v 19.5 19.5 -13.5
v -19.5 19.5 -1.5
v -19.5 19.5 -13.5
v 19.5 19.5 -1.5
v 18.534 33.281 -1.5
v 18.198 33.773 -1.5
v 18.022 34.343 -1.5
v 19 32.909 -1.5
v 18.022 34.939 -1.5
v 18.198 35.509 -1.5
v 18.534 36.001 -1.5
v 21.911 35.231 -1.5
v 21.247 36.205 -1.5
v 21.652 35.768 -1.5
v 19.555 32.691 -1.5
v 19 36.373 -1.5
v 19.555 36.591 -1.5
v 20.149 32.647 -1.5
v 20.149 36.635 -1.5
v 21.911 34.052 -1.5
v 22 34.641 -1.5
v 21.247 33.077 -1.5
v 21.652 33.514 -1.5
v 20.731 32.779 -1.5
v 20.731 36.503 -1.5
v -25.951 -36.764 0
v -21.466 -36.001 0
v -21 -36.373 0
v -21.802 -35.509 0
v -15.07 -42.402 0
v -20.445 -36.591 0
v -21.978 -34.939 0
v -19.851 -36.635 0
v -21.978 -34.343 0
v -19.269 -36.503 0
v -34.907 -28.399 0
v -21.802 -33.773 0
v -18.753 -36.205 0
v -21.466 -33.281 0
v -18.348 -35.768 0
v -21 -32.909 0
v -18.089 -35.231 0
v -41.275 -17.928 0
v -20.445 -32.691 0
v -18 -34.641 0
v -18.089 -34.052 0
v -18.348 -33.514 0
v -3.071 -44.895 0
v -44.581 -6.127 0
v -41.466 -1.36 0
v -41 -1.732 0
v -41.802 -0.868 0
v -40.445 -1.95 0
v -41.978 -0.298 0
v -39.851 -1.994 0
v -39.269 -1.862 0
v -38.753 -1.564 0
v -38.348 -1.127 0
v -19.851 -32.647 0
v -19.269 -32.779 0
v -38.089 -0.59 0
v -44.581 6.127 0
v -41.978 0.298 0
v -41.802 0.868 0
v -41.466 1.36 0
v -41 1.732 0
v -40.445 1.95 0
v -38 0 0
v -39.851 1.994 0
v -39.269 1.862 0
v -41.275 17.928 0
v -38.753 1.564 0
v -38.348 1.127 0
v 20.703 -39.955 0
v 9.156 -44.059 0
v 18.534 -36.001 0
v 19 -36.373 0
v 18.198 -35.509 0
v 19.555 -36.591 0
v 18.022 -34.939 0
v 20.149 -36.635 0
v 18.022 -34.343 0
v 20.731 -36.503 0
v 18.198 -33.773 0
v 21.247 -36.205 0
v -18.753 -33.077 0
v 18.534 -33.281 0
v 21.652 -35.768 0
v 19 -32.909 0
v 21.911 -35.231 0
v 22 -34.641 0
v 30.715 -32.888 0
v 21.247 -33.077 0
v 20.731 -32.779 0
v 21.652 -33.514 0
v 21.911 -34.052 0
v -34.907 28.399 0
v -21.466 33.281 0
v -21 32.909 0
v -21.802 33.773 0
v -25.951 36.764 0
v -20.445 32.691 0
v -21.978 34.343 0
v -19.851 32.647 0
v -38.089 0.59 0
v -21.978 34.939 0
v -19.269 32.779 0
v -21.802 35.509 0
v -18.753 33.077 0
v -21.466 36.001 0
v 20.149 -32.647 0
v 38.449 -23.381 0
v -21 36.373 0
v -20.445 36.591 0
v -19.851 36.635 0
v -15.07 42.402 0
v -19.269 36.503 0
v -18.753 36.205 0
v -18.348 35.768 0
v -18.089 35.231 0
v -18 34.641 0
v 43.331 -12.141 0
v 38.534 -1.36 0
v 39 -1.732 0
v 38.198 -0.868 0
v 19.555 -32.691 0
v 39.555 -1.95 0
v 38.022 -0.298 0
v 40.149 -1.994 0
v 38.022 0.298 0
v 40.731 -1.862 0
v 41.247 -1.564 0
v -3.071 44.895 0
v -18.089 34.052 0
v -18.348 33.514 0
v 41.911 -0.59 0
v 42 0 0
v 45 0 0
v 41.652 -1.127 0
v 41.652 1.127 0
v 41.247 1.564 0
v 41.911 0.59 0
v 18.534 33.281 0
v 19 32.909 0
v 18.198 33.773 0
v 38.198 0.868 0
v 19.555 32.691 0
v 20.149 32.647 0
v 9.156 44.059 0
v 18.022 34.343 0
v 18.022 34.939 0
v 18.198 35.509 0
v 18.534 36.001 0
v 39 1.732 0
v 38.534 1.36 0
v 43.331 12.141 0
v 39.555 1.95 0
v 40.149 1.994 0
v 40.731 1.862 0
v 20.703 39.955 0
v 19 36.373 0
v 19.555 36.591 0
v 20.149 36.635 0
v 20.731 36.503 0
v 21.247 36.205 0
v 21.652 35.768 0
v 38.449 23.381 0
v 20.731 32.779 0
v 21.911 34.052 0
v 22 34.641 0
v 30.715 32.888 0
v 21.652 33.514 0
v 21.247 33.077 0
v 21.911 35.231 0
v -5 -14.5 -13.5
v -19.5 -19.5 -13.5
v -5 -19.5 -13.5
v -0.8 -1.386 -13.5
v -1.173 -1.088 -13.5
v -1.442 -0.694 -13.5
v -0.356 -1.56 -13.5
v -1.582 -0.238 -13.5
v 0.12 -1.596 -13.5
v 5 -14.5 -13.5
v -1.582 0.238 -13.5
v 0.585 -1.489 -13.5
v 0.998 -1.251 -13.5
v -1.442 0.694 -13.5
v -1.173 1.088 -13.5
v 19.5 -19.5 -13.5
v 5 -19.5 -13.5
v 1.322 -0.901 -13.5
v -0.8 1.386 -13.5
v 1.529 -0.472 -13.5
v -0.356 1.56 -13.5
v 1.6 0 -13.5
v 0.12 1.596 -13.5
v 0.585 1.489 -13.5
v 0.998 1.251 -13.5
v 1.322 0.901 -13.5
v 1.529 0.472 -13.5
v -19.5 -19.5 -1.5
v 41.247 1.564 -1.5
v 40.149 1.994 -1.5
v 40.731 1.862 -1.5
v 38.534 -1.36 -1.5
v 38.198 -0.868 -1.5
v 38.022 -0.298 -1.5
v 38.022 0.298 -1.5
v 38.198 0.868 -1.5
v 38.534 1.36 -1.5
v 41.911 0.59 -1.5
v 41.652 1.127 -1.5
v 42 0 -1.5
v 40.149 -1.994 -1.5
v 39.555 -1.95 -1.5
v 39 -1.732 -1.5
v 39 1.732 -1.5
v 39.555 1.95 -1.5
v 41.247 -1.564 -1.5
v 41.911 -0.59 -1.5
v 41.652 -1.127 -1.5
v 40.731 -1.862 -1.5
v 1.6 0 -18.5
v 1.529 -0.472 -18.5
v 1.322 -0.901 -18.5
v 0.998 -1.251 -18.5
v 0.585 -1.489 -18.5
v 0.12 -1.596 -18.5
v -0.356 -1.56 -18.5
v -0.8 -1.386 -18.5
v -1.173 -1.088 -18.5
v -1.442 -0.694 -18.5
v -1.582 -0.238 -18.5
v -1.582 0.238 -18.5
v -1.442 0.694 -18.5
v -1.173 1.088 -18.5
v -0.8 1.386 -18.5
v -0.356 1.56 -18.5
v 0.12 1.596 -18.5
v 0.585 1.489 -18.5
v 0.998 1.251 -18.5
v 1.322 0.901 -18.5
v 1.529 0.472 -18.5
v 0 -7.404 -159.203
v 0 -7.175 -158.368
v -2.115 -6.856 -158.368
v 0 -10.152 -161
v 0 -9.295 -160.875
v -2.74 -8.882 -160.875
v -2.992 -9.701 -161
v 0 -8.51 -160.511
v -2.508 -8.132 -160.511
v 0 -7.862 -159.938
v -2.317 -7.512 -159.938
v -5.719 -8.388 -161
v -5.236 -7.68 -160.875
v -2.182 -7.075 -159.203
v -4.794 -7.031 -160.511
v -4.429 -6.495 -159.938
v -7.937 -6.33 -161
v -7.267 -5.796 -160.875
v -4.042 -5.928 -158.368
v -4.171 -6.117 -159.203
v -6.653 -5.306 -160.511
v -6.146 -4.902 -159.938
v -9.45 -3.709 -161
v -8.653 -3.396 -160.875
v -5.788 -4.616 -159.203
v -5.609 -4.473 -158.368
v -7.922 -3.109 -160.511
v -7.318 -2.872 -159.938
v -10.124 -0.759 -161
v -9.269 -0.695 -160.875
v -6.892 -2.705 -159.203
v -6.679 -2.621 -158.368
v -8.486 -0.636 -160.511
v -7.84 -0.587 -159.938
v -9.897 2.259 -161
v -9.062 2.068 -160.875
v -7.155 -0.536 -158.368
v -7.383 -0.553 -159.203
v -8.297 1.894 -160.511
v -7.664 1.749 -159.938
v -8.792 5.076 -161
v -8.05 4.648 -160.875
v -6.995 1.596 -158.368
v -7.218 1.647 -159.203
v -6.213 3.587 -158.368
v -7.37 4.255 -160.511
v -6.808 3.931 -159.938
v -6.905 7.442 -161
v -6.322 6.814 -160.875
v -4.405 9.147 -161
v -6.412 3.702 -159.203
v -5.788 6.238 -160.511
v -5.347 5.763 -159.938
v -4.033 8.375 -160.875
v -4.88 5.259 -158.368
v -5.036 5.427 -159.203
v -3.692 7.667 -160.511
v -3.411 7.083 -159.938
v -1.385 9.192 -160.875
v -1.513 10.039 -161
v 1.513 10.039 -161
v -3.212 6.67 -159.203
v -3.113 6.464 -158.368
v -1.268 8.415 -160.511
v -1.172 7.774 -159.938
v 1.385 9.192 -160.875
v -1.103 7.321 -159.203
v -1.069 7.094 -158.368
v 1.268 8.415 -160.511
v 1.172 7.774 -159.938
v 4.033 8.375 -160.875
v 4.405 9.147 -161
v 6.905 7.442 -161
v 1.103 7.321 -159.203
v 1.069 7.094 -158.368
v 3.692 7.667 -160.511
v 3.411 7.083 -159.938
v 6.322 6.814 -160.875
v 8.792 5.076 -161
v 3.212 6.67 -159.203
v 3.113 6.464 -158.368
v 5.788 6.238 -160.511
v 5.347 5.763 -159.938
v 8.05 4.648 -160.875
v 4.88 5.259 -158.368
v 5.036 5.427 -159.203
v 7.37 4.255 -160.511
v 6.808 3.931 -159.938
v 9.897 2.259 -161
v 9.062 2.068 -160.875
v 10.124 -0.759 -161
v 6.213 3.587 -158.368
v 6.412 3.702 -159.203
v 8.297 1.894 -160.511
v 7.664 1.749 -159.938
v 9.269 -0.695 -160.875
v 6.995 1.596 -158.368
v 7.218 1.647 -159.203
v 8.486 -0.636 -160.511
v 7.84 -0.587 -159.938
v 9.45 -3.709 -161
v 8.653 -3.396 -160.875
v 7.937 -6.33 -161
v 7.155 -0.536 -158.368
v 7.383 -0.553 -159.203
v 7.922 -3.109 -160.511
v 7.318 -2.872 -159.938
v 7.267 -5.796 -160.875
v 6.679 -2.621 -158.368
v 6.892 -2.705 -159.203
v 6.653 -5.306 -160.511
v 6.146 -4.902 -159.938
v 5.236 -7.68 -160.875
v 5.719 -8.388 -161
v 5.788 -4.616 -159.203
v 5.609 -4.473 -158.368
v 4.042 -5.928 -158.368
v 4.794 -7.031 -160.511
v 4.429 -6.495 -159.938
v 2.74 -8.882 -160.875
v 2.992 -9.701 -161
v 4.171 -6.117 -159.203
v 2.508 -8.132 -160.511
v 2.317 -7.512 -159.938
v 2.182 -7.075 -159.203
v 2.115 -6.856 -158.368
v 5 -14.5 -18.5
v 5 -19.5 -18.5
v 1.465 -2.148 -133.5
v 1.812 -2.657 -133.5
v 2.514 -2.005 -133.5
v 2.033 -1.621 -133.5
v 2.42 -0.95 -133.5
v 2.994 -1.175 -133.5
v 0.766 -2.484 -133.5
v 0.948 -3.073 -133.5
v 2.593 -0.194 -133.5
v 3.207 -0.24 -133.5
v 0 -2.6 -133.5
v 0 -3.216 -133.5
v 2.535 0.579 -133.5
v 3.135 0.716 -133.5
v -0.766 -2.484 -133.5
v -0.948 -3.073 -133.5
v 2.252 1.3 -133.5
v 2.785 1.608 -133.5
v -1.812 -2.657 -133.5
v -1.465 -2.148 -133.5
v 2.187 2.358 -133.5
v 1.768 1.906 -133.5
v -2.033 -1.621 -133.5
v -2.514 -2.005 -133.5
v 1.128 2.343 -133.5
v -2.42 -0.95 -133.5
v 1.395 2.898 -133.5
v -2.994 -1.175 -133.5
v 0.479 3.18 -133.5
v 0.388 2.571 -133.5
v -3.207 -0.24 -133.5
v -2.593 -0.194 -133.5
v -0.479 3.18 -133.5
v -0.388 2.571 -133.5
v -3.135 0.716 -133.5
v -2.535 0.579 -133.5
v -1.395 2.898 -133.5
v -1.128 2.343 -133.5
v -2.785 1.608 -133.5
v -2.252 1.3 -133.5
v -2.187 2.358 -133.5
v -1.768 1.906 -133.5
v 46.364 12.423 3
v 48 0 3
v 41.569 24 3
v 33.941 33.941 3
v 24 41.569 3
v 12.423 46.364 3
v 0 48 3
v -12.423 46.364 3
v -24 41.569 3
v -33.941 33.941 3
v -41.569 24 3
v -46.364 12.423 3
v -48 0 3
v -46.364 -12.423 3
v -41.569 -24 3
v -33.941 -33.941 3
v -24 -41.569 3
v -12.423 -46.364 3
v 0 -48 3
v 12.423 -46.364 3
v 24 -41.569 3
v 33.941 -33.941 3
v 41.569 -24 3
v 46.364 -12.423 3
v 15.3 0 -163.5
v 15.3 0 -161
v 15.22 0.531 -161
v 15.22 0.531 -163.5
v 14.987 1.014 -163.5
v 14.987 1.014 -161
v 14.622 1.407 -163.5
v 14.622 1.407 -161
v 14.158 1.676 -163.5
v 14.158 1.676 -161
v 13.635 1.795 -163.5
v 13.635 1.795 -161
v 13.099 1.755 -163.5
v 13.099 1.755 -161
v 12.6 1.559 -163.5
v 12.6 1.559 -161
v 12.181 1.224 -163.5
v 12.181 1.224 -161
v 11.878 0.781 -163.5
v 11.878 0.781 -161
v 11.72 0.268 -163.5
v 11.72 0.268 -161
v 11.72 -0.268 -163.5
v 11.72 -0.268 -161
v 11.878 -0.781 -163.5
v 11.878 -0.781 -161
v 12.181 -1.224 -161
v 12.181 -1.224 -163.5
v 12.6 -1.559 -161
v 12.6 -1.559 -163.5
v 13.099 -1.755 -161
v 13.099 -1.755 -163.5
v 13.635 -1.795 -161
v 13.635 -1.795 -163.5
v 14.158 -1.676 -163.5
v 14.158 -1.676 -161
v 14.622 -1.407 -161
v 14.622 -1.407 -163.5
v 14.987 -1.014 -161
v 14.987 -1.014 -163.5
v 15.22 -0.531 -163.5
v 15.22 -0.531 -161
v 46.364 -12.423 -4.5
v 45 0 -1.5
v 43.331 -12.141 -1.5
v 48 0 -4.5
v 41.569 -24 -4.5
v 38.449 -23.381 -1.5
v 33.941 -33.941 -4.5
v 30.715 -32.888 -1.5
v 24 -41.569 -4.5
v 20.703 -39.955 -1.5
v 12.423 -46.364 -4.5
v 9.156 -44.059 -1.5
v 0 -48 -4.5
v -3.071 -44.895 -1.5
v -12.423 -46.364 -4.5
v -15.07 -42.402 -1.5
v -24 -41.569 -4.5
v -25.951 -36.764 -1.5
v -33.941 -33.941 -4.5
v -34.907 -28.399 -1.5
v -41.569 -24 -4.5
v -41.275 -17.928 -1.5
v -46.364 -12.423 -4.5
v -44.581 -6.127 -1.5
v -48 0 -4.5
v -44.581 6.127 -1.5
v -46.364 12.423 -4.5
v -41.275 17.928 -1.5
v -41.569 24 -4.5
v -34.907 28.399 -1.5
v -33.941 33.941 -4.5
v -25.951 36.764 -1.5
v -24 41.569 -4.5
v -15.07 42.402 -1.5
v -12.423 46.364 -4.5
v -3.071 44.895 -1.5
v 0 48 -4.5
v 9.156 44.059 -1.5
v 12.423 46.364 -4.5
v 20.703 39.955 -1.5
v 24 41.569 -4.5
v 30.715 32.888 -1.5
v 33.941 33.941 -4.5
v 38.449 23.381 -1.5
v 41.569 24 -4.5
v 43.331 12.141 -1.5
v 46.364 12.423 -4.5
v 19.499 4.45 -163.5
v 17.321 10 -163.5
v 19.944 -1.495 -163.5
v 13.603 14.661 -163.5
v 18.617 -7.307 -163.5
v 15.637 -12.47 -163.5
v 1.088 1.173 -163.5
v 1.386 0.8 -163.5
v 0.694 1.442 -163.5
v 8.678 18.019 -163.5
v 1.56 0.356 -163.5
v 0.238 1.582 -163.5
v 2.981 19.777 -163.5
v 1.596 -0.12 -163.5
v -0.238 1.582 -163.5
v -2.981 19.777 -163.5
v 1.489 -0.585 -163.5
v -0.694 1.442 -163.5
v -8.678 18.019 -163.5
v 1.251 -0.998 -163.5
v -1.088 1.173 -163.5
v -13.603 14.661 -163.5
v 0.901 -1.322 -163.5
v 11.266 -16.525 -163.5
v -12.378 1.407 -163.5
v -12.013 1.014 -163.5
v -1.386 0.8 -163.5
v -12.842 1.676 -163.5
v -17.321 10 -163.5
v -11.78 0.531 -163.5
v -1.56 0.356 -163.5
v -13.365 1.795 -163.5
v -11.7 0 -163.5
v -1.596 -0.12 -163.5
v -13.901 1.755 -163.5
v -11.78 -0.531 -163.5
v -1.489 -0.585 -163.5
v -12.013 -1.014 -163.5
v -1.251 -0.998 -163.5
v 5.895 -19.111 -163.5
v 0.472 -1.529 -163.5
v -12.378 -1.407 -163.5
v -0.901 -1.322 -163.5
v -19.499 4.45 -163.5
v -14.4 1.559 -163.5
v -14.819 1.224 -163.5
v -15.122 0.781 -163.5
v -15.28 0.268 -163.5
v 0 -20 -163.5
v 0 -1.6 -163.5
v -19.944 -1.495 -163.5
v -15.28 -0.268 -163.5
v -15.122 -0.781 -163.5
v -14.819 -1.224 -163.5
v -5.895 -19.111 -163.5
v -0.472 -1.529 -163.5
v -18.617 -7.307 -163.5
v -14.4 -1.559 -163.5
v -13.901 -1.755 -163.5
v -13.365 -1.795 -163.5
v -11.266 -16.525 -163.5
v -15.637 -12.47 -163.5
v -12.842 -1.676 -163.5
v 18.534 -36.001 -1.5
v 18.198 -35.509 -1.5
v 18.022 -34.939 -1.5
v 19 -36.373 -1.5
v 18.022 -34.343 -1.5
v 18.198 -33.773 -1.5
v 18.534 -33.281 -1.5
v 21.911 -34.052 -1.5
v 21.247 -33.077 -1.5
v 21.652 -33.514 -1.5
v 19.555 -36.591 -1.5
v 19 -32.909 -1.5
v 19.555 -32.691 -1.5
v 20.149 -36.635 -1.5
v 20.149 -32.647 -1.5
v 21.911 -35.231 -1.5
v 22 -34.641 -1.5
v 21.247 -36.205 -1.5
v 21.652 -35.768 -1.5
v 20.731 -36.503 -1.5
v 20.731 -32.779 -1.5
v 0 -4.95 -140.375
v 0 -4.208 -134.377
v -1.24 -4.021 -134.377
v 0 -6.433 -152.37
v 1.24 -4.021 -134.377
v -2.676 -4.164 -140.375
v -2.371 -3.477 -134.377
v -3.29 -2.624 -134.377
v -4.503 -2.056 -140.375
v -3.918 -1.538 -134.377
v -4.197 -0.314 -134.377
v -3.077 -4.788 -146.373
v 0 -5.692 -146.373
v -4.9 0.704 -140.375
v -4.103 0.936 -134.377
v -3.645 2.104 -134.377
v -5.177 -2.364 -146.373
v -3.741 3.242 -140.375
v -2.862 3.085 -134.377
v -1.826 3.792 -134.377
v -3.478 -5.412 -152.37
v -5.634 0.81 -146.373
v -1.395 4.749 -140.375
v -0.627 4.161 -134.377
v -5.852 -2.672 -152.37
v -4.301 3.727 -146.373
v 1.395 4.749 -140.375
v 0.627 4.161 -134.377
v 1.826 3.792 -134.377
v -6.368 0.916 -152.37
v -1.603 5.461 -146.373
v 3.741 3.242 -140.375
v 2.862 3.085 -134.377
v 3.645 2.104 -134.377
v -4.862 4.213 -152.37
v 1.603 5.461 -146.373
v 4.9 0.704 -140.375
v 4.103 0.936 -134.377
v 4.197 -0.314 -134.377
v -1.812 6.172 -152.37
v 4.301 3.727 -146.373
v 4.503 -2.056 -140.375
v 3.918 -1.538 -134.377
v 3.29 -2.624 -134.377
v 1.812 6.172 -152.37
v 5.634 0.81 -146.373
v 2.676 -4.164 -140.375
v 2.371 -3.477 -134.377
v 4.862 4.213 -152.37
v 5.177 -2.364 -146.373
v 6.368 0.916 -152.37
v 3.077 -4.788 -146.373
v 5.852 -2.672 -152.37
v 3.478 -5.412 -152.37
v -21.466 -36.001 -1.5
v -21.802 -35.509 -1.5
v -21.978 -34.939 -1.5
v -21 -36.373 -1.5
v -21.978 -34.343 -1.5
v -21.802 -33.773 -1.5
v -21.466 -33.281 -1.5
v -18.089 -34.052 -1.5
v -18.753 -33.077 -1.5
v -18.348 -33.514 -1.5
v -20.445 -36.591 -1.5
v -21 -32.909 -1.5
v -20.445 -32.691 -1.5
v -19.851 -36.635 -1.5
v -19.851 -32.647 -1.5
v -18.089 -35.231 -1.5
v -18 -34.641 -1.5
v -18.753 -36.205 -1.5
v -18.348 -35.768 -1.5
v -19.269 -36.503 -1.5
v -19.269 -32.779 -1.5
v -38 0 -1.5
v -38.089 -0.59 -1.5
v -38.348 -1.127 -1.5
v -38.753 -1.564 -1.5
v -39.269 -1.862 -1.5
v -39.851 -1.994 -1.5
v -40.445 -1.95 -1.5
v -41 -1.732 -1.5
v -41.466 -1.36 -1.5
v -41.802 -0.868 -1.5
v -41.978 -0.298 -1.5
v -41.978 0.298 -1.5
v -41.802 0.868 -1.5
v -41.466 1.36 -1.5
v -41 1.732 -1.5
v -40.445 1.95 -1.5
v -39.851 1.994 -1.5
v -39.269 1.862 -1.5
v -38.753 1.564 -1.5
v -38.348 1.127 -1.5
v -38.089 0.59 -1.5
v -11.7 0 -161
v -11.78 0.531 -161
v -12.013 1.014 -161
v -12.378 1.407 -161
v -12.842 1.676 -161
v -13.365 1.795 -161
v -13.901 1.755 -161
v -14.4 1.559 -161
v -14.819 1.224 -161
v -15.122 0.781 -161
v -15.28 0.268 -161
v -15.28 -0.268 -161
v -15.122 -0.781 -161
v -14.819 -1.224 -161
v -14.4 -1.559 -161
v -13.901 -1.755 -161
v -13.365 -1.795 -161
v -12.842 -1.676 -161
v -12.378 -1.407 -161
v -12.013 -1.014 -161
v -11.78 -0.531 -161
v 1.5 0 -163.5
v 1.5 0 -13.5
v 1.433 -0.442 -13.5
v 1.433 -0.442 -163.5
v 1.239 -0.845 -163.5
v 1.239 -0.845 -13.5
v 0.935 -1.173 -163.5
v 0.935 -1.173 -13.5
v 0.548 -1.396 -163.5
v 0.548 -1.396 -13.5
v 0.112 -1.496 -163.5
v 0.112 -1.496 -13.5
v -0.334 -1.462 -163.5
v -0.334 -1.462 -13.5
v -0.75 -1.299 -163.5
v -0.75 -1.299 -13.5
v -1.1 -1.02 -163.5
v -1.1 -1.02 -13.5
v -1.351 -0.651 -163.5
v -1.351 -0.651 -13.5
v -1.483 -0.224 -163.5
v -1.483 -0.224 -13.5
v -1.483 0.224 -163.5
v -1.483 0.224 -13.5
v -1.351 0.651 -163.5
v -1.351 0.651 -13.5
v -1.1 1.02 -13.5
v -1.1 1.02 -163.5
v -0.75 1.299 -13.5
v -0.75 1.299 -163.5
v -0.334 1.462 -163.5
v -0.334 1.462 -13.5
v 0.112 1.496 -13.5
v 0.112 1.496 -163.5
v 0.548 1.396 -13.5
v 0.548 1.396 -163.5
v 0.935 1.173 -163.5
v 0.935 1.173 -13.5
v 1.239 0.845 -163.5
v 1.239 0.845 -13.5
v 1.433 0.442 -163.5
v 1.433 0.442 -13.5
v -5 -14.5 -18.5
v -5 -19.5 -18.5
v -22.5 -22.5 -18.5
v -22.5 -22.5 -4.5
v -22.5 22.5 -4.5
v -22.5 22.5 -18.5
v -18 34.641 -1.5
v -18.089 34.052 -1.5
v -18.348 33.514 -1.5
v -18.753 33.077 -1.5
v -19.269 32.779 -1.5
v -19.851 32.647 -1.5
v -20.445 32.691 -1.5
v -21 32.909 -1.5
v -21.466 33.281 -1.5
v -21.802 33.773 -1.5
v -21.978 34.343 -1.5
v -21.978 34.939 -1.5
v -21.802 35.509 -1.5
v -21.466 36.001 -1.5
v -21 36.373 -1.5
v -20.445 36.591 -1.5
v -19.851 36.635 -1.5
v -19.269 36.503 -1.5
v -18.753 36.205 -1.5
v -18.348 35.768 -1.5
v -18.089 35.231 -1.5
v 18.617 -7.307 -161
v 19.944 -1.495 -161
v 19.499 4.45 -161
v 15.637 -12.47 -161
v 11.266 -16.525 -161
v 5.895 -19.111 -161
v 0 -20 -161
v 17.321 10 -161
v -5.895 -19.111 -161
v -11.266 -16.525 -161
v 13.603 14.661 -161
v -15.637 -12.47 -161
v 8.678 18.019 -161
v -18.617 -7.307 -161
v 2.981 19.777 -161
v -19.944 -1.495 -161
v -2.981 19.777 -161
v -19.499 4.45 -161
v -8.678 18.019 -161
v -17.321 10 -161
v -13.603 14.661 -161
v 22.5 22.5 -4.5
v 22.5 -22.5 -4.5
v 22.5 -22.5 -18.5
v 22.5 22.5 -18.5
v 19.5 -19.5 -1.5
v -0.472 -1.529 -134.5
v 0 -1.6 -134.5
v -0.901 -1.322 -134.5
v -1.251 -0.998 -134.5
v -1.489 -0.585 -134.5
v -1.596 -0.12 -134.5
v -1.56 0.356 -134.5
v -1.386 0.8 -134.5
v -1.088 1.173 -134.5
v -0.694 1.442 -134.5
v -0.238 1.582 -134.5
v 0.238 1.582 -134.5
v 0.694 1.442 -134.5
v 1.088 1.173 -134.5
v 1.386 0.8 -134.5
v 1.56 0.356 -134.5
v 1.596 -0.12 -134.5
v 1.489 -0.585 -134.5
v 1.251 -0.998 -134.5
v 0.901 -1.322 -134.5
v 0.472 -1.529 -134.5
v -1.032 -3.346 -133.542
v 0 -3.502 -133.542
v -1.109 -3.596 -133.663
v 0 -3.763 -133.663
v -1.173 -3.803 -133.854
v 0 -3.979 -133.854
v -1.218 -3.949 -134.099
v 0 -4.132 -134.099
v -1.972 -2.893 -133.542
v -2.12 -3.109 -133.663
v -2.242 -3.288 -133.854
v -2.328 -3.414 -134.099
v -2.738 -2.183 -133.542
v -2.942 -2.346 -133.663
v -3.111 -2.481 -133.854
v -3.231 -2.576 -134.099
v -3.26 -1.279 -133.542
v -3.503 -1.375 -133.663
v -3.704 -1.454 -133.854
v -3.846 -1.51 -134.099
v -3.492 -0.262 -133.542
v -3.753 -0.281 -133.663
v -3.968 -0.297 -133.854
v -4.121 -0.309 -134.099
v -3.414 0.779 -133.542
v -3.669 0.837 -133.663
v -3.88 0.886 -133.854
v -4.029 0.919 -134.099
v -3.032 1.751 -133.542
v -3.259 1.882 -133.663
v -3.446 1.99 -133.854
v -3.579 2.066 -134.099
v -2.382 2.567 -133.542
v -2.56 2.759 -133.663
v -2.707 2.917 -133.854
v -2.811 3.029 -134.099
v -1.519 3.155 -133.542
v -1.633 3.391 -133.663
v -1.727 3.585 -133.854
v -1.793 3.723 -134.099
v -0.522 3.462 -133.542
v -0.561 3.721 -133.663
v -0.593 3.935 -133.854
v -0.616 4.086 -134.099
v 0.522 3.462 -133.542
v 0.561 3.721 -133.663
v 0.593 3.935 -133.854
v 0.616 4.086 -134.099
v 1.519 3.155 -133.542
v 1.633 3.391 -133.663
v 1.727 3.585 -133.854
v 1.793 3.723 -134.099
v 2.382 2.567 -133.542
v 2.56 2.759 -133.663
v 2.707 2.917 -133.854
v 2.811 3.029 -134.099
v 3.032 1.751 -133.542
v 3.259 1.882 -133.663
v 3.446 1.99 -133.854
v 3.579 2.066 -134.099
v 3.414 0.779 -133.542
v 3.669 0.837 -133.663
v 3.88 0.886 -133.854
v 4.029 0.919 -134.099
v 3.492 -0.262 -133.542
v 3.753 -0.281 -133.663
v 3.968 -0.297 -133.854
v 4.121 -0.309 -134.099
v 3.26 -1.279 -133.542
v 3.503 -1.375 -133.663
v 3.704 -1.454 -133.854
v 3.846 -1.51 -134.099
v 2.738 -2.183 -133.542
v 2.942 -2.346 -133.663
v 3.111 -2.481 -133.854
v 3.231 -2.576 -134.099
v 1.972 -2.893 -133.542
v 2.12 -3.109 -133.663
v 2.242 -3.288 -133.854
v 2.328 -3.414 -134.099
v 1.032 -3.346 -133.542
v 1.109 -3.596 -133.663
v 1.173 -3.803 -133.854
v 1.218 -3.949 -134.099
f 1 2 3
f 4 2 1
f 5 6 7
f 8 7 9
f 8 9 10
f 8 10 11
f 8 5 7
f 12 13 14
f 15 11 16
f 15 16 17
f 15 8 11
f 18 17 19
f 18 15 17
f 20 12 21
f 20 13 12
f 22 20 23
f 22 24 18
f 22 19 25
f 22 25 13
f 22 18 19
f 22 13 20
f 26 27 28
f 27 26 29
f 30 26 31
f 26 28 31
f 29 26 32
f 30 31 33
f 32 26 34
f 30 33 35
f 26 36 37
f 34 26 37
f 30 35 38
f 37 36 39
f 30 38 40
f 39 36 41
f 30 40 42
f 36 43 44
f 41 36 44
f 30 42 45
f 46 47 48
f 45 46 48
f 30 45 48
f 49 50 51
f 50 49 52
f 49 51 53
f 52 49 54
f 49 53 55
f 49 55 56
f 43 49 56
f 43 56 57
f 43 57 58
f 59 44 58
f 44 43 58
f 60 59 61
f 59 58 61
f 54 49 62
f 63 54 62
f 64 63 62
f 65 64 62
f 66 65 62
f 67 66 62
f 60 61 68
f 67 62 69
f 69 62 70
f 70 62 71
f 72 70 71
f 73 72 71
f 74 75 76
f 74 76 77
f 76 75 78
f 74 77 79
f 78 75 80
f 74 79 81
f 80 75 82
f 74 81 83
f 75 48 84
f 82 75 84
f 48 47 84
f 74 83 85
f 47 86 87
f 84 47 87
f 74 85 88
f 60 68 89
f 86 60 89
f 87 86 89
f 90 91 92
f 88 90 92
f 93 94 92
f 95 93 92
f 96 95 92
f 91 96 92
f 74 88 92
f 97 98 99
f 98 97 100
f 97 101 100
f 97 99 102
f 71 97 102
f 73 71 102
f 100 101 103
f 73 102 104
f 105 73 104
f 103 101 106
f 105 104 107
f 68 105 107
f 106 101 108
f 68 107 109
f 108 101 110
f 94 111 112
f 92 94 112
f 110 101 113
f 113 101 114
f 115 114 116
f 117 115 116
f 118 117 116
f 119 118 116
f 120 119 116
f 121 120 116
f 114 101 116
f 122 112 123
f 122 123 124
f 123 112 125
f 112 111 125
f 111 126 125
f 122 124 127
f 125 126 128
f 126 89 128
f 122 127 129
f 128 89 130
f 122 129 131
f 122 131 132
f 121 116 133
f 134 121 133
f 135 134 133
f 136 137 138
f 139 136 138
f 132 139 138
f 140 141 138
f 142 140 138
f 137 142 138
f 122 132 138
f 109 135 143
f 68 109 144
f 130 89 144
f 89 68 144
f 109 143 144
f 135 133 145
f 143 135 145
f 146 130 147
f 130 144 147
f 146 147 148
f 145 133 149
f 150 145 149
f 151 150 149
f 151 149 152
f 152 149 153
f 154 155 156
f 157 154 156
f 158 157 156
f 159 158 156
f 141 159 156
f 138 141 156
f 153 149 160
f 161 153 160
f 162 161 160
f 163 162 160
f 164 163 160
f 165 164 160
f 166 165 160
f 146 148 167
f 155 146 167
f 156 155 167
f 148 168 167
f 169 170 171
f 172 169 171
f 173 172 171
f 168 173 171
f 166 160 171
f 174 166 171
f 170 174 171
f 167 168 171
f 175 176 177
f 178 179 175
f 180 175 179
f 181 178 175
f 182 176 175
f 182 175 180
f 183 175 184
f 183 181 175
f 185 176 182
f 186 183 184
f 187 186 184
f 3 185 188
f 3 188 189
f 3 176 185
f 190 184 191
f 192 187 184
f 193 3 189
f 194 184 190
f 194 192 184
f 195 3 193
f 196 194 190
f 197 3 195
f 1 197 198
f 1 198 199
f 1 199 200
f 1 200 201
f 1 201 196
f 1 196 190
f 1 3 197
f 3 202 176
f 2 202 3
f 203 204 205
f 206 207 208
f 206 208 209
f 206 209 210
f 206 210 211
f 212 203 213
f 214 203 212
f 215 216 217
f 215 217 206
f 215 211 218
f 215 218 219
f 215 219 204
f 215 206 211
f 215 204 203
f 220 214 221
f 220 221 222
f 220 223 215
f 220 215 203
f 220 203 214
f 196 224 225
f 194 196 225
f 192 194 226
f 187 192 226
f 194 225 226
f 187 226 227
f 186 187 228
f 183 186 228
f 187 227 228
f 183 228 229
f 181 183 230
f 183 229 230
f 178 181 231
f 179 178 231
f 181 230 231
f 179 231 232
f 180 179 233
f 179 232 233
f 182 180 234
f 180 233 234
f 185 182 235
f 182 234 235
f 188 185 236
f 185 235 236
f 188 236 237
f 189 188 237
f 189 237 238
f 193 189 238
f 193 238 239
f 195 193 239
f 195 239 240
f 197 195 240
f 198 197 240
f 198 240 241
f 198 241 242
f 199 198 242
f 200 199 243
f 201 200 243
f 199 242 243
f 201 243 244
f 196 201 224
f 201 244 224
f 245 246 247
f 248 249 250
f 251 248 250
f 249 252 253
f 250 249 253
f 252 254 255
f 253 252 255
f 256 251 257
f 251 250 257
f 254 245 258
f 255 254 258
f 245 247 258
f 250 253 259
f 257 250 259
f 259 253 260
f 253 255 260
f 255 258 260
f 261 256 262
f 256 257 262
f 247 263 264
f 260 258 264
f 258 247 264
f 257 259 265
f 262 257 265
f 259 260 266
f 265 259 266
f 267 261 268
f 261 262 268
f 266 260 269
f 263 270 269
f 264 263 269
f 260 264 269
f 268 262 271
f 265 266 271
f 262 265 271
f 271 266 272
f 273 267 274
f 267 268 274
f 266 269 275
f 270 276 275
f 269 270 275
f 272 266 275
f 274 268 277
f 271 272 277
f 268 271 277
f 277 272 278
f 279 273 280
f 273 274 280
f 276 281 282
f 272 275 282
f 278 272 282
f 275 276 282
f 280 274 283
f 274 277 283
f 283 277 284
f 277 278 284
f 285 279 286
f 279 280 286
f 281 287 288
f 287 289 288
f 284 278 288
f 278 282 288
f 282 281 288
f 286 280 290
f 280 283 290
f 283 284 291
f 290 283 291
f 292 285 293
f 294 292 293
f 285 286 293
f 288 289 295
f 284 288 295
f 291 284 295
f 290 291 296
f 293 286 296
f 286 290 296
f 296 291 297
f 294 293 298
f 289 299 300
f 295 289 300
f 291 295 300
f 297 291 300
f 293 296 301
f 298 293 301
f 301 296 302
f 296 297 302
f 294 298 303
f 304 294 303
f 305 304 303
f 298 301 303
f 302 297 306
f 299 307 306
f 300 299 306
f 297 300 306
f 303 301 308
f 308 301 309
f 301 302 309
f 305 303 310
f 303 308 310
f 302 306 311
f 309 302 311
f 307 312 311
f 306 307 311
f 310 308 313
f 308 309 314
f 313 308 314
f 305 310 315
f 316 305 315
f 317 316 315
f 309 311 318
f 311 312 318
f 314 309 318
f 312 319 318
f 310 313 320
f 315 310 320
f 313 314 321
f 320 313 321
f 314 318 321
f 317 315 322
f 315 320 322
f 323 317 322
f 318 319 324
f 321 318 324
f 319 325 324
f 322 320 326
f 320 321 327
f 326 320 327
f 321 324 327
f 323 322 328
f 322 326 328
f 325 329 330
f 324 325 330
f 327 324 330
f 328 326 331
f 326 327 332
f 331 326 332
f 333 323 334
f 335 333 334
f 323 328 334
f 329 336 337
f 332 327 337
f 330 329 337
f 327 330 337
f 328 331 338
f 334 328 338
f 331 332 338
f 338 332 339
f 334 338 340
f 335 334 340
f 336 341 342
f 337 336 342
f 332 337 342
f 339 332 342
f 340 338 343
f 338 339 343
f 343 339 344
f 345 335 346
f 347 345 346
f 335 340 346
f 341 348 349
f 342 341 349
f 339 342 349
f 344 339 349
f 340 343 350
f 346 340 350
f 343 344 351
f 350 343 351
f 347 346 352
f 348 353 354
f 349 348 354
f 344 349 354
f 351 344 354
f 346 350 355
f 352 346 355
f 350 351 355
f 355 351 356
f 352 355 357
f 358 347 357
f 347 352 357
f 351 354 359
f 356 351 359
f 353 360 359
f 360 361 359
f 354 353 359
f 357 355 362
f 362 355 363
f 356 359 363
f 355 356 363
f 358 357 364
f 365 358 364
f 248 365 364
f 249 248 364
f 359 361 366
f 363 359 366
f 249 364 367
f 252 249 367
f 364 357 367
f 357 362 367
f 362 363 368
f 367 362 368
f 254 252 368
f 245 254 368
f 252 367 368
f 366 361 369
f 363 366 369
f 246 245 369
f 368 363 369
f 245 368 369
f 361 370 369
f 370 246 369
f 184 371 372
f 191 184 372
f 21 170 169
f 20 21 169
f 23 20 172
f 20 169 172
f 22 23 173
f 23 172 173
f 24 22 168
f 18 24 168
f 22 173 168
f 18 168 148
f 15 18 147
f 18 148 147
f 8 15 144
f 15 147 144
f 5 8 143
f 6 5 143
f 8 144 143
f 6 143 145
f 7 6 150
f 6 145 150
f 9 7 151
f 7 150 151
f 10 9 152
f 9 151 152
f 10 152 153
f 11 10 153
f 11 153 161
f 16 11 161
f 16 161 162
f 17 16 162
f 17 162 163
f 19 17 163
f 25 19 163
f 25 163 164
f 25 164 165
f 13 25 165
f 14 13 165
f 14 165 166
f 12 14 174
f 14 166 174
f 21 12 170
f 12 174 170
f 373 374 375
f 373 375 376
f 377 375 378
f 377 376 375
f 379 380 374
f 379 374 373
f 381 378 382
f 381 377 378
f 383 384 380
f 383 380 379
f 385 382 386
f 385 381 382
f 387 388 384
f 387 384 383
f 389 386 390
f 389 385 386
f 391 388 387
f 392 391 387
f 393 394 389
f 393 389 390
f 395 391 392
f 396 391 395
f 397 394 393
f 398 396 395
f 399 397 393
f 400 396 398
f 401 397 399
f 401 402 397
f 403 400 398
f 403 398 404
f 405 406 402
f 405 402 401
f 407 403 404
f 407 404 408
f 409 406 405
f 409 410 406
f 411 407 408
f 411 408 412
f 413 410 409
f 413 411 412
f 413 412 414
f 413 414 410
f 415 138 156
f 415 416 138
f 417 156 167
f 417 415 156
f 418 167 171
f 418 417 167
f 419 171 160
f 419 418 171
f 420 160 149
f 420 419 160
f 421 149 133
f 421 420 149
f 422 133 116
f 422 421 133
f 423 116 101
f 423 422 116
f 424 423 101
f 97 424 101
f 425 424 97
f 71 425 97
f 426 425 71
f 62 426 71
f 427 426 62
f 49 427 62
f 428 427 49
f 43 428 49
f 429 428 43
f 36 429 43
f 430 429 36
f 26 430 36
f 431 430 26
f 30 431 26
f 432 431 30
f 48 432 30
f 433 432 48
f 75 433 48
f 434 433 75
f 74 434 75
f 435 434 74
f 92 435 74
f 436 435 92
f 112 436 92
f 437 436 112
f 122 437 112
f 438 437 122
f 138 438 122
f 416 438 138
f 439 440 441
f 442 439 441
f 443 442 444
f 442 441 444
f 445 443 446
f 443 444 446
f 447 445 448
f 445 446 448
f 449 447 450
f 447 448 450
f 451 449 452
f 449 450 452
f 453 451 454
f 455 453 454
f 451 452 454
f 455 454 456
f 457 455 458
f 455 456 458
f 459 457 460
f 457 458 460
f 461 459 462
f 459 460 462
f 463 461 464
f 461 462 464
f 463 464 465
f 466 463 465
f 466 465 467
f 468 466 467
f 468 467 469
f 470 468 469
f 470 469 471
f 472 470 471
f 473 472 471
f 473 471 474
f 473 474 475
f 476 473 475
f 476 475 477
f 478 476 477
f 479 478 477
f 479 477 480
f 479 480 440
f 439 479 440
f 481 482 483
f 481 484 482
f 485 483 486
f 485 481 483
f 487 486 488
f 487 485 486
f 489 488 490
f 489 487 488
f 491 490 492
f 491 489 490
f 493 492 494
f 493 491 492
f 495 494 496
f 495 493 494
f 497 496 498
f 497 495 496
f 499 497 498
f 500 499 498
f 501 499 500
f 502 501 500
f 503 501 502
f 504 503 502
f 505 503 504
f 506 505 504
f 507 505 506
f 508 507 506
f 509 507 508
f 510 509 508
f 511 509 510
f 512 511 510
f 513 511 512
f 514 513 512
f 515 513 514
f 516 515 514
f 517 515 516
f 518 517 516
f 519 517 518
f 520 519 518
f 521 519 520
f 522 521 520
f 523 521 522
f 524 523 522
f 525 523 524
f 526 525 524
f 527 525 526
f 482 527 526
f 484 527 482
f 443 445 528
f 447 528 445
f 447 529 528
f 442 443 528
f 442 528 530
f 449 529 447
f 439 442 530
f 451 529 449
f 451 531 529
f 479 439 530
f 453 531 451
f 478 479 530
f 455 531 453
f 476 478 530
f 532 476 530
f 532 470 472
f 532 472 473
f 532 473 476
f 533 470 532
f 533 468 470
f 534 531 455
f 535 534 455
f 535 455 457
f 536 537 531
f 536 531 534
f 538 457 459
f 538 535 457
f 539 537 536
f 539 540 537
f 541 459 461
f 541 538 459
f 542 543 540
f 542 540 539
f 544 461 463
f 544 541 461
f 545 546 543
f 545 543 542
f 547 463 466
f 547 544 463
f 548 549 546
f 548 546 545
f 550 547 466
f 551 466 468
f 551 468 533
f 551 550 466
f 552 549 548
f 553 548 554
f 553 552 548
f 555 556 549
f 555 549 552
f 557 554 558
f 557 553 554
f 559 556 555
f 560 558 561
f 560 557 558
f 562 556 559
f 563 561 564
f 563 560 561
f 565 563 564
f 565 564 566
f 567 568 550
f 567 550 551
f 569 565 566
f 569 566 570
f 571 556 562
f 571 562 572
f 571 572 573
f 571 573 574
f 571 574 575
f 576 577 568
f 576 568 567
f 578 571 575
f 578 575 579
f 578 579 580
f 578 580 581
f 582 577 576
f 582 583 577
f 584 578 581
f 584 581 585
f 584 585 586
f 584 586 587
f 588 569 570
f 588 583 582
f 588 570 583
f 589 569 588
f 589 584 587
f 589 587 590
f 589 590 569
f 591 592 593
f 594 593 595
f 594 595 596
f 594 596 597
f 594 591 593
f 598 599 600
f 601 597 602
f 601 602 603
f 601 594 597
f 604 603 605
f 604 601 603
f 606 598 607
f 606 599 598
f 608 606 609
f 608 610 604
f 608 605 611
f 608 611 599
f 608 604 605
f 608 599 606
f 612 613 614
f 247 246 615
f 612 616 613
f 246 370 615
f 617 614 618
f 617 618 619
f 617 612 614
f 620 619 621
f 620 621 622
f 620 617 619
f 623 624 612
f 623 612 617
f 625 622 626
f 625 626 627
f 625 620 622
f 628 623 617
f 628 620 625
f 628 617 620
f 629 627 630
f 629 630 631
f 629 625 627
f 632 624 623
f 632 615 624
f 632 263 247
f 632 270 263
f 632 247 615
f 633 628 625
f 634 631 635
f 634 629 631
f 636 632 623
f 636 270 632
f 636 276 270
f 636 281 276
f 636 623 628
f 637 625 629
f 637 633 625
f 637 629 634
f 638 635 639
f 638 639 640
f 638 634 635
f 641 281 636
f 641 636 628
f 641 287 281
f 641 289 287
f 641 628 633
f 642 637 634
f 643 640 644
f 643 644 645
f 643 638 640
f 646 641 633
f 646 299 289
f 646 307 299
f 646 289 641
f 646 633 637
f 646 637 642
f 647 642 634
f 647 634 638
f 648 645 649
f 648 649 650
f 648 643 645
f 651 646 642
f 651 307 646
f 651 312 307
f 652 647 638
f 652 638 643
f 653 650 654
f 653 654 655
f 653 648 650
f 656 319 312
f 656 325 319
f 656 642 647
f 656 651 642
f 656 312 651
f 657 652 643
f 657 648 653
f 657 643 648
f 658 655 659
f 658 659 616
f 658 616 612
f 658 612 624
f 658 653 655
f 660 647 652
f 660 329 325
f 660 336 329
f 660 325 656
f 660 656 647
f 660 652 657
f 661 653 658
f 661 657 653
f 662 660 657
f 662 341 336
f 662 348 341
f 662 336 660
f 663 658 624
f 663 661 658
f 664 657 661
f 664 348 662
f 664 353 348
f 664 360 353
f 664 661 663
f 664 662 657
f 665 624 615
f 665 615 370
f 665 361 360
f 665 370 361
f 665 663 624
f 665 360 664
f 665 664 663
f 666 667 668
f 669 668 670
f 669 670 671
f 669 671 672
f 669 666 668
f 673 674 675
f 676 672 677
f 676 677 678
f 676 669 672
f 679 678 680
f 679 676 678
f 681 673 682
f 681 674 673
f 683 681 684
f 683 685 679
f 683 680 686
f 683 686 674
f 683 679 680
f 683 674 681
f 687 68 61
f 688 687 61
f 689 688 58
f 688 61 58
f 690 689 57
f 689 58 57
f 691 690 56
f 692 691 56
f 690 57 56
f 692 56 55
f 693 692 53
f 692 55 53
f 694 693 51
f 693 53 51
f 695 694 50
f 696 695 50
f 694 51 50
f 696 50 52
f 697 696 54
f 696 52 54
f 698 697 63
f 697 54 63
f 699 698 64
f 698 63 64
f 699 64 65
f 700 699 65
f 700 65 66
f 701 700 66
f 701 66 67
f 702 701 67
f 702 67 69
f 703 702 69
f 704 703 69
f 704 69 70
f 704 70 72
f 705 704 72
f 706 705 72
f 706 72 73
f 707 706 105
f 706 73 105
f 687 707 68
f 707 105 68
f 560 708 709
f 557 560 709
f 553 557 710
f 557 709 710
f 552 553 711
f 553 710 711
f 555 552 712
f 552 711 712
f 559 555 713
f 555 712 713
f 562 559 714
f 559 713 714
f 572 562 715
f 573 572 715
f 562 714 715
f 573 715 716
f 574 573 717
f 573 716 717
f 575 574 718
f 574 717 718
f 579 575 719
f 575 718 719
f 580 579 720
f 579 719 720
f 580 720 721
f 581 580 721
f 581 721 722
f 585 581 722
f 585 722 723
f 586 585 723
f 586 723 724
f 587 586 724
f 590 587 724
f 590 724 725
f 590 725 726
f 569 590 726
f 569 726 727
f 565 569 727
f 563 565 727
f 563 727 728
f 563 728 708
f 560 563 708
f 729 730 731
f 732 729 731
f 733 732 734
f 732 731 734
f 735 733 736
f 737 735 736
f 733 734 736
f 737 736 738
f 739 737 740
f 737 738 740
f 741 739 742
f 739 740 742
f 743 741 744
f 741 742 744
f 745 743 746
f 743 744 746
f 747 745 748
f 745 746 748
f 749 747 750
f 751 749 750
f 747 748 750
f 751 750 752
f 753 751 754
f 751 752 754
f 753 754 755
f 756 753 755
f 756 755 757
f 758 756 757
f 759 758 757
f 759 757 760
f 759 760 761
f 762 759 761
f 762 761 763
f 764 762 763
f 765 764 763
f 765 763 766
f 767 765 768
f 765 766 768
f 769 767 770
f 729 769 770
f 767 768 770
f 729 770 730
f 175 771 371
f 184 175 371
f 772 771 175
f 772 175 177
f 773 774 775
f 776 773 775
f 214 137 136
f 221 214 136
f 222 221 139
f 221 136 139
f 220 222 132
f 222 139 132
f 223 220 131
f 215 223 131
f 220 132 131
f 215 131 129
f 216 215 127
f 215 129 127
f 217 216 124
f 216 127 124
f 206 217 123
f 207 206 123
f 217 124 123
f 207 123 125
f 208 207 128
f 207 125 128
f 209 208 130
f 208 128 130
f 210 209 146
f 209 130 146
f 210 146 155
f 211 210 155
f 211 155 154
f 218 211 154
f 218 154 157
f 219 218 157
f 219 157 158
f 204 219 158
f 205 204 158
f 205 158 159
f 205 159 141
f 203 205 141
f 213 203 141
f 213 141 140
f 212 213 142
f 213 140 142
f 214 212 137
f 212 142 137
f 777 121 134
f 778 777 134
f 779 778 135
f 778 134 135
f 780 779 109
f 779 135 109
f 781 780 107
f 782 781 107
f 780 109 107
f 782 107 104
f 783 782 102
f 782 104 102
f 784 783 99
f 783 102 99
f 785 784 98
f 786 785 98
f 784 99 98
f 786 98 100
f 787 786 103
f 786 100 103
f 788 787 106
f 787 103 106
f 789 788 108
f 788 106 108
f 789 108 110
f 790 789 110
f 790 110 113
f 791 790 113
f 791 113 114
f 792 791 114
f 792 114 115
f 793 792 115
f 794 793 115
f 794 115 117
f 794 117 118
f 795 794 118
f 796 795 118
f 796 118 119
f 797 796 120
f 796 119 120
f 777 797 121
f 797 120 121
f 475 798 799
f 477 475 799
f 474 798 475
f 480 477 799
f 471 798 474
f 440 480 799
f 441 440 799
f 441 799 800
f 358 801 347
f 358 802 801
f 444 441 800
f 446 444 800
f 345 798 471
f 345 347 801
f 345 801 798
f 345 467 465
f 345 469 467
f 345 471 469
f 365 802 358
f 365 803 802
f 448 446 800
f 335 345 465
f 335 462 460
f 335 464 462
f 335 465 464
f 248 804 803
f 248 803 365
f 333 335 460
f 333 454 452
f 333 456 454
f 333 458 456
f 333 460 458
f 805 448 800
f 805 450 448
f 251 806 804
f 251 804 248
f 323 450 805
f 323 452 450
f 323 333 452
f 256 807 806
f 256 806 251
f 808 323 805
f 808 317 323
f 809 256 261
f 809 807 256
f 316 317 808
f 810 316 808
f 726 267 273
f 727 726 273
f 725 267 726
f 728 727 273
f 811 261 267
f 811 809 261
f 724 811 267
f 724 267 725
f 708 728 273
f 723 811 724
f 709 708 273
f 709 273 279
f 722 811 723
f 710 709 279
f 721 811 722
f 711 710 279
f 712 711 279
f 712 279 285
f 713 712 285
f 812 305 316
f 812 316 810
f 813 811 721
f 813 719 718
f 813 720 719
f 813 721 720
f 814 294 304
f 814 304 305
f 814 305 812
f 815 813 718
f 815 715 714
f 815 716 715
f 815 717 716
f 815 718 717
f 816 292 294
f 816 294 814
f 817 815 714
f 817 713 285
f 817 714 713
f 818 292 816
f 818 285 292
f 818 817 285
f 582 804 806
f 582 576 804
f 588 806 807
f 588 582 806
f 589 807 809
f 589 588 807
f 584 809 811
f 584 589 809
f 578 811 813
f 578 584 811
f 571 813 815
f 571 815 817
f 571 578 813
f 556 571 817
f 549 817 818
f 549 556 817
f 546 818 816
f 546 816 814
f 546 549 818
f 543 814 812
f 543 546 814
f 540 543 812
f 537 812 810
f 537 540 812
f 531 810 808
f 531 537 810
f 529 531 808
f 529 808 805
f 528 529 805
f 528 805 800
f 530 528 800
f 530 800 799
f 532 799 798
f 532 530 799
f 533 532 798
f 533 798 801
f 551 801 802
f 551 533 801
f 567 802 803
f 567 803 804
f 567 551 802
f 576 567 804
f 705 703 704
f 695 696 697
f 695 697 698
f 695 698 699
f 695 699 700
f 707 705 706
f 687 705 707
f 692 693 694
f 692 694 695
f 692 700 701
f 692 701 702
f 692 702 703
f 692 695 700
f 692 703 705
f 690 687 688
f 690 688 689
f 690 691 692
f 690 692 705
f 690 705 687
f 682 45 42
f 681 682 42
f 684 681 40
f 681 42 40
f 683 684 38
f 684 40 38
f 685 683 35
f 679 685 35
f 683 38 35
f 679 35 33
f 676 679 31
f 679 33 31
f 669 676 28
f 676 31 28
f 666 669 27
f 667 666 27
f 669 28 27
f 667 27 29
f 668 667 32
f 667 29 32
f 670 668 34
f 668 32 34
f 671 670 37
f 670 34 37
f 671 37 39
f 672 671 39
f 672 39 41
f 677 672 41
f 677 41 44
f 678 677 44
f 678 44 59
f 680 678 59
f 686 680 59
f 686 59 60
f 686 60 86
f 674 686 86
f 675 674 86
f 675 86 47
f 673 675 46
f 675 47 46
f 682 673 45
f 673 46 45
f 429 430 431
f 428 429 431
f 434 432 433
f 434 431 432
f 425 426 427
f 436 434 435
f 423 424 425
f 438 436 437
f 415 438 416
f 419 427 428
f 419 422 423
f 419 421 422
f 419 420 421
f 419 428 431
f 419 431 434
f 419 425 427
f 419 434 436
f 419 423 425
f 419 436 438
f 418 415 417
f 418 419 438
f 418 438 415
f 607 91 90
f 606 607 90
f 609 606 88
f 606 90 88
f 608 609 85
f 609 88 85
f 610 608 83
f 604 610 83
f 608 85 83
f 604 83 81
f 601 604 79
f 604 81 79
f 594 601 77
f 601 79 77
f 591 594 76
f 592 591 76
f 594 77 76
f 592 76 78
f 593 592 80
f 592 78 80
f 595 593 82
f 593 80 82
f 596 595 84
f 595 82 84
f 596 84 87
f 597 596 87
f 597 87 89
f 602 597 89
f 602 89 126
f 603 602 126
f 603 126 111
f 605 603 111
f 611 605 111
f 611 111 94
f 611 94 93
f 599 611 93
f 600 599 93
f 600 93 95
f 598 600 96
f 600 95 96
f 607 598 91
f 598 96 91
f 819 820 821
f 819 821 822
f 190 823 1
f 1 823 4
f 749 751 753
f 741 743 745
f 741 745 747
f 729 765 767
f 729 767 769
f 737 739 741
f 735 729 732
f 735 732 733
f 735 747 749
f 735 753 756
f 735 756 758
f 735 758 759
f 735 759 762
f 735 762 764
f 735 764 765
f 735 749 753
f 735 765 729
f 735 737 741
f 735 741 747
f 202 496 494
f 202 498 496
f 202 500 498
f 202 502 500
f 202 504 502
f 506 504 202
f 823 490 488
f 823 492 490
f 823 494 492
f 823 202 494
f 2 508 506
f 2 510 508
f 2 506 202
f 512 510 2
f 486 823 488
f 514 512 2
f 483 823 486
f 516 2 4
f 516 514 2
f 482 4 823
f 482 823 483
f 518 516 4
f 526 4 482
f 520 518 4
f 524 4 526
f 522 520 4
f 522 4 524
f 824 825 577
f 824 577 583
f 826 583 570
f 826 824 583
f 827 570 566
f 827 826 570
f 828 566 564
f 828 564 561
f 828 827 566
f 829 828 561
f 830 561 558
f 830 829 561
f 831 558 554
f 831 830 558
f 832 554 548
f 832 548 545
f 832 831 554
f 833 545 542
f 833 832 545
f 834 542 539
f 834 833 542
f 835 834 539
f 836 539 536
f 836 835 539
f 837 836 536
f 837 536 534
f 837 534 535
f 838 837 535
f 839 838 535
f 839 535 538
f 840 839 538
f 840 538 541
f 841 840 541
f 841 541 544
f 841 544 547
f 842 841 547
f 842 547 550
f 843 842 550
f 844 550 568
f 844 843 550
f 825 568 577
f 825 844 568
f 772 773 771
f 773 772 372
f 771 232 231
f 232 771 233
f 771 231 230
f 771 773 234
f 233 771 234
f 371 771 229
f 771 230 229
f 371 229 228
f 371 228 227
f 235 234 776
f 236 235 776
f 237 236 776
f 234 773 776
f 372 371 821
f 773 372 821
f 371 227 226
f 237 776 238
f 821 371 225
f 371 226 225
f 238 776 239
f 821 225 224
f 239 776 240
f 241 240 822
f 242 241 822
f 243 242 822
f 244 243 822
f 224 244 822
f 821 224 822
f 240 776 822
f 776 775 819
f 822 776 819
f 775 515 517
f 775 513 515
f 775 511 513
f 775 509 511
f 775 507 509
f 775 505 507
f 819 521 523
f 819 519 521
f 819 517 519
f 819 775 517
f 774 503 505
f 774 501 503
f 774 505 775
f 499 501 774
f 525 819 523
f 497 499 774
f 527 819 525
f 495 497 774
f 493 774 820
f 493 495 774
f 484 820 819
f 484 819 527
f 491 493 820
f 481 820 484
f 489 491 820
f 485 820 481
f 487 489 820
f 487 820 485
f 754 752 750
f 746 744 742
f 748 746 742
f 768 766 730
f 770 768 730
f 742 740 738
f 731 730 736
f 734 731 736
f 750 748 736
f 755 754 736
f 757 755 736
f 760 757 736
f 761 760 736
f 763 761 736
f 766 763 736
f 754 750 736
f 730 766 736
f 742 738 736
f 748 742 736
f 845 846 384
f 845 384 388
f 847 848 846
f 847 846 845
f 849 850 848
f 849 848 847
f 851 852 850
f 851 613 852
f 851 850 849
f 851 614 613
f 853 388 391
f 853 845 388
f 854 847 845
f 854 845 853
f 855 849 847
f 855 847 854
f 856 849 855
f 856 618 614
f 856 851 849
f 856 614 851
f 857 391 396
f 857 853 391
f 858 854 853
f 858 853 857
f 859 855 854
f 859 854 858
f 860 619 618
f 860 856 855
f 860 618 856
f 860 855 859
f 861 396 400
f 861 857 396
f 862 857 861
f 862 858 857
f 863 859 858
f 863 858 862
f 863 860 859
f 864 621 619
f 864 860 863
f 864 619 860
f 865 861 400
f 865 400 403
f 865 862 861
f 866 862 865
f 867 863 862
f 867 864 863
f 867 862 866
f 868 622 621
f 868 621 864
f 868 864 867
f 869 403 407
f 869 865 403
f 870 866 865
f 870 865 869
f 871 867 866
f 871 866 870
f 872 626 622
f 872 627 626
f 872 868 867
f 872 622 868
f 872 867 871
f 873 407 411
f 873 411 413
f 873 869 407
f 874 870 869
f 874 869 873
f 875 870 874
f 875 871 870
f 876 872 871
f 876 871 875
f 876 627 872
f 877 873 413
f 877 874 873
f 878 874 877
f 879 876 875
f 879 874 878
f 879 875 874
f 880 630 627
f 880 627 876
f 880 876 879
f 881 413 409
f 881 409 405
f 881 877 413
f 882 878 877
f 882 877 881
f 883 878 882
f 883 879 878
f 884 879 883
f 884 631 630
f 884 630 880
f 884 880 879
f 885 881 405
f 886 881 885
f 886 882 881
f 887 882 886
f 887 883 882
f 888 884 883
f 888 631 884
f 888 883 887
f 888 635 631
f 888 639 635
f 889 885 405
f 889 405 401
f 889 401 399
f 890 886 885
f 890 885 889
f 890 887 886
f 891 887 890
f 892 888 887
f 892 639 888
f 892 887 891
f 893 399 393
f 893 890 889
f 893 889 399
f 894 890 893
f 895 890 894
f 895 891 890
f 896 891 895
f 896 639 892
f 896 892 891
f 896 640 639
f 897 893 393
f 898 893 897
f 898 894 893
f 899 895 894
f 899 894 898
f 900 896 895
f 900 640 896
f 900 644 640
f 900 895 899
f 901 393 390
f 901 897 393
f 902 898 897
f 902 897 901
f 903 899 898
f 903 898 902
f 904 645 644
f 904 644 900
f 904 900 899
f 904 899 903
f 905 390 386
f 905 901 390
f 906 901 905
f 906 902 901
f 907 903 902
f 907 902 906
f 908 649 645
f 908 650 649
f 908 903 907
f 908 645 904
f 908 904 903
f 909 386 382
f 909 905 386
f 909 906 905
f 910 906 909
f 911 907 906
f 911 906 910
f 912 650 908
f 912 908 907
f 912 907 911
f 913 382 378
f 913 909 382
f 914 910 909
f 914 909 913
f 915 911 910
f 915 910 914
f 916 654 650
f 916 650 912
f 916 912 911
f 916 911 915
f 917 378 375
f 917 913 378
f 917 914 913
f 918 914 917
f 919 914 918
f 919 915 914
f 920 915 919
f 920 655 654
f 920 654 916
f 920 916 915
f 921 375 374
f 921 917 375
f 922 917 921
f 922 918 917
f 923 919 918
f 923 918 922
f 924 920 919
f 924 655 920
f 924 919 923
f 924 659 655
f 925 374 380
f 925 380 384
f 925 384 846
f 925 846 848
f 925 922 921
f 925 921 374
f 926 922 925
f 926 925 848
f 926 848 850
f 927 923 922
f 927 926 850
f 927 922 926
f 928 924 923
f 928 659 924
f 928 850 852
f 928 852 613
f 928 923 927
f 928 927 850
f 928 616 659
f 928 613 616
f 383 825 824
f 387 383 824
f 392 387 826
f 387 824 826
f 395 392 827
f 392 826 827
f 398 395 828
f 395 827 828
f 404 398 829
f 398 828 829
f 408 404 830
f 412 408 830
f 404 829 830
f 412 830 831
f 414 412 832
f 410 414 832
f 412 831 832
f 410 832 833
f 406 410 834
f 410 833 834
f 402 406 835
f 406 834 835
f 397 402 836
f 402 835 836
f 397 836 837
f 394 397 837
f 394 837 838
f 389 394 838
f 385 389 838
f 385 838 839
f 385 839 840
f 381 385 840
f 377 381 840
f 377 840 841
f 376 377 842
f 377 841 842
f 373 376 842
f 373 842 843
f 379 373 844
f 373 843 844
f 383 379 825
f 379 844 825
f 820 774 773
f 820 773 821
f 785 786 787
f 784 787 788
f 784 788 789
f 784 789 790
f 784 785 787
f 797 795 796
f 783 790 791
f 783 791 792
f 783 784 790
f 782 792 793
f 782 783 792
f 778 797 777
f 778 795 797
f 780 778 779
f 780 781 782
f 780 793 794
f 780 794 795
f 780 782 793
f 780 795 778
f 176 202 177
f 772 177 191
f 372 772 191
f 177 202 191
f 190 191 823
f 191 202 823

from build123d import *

# Parameters (mm, degrees)
F0_R      = 45
F1_DEPTH  = 3
F1_TAPER  = -45
F2_R      = 2
F3_DEPTH  = 1.5
F4_R      = 45
F5_DEPTH  = 3
F5_TAPER  = -45
F6_W      = 45
F6_H      = 45
F7_DEPTH  = 17
F8_W      = 39
F8_H      = 39
F10_DEPTH = 12
F11_W     = 10
F11_H     = 5
F11_R     = 1.6
F12_DEPTH = 5
F13_R     = 1.5
F14_DEPTH = 150
F17_R     = 1.8
F18_DEPTH = 2.501
F19_R     = 3
F20_SIZE  = 1
F21_R     = 1


with BuildPart() as f1:
    # F0 (on Top) → F1 (new body)
    with BuildSketch(Plane.XY):
        Circle(F0_R)
    extrude(amount=F1_DEPTH, taper=F1_TAPER)

    # F2 (on face) → F3 (join)
    with BuildSketch(Plane(origin=(0, 0, 0), x_dir=(1, 0, 0), z_dir=(0, 0, -1))):
        with Locations((40, 0)):
            Circle(F2_R)
        with Locations((20, 34.6410161514)):
            Circle(F2_R)
        with Locations((-20, 34.6410161514)):
            Circle(F2_R)
        with Locations((-40, 0)):
            Circle(F2_R)
        with Locations((-20, -34.6410161514)):
            Circle(F2_R)
        with Locations((20, -34.6410161514)):
            Circle(F2_R)
    extrude(amount=F3_DEPTH)


with BuildPart() as f5:
    # F4 (on face) → F5 (new body)
    with BuildSketch(Plane(origin=(0, 0, -1.5), x_dir=(1, 0, 0), z_dir=(0, 0, -1))):
        Circle(F4_R)
    extrude(amount=F5_DEPTH, taper=F5_TAPER)

    # F6 (on face) → F7 (join)
    with BuildSketch(Plane.XY.offset(-1.5)):
        Rectangle(F6_W, F6_H)
    extrude(amount=-F7_DEPTH)

    # F8 (on face) → F10 (cut, through all)
    with BuildSketch(Plane.XY.offset(-1.5)):
        Rectangle(F8_W, F8_H)
    extrude(amount=-F10_DEPTH, mode=Mode.SUBTRACT)

    # F11 (on face) → F12 (cut, through all)
    with BuildSketch(Plane(origin=(0, 0, -18.5), x_dir=(1, 0, 0), z_dir=(0, 0, -1))):
        with Locations((0, 17)):
            Rectangle(F11_W, F11_H)
        Circle(F11_R)
    extrude(amount=-F12_DEPTH, mode=Mode.SUBTRACT)


with BuildPart() as f14:
    # F13 (on offset) → F14 (new body)
    with BuildSketch(Plane(origin=(0, 0, -13.5), x_dir=(1, 0, 0), z_dir=(0, 0, -1))):
        Circle(F13_R)
    extrude(amount=F14_DEPTH)


with BuildPart() as f16:
    # F15 (on Right) → F16 (revolve)
    with BuildSketch(Plane.YZ):
        Polygon((-20, -161), (-20, -163.5), (-1.6, -163.5), (-1.6, -133.5), (-4.1, -133.5), (-7.5, -161), align=None)
    revolve(axis=Axis((0, 0, -84.7821459174), (0, 0, -1)))

    # F17 (on face) → F18 (cut, through all)
    with BuildSketch(Plane.XY.offset(-161)):
        with Locations((13.5, 0)):
            Circle(F17_R)
        with Locations((-13.5, 0)):
            Circle(F17_R)
    extrude(amount=-F18_DEPTH, mode=Mode.SUBTRACT)

    # F19
    f19_edges = [f16.edges().sort_by_distance(p)[0] for p in [
        (0, 7.5, -161),
    ]]
    fillet(f19_edges, radius=F19_R)

    # F20
    f20_edges = [f16.edges().sort_by_distance(p)[0] for p in [
        (0, 1.6, -133.5),
    ]]
    chamfer(f20_edges, length=F20_SIZE)

    # F21
    f21_edges = [f16.edges().sort_by_distance(p)[0] for p in [
        (0, 4.1, -133.5),
    ]]
    fillet(f21_edges, radius=F21_R)


solid = Compound([f1.part, f5.part, f14.part, f16.part])
